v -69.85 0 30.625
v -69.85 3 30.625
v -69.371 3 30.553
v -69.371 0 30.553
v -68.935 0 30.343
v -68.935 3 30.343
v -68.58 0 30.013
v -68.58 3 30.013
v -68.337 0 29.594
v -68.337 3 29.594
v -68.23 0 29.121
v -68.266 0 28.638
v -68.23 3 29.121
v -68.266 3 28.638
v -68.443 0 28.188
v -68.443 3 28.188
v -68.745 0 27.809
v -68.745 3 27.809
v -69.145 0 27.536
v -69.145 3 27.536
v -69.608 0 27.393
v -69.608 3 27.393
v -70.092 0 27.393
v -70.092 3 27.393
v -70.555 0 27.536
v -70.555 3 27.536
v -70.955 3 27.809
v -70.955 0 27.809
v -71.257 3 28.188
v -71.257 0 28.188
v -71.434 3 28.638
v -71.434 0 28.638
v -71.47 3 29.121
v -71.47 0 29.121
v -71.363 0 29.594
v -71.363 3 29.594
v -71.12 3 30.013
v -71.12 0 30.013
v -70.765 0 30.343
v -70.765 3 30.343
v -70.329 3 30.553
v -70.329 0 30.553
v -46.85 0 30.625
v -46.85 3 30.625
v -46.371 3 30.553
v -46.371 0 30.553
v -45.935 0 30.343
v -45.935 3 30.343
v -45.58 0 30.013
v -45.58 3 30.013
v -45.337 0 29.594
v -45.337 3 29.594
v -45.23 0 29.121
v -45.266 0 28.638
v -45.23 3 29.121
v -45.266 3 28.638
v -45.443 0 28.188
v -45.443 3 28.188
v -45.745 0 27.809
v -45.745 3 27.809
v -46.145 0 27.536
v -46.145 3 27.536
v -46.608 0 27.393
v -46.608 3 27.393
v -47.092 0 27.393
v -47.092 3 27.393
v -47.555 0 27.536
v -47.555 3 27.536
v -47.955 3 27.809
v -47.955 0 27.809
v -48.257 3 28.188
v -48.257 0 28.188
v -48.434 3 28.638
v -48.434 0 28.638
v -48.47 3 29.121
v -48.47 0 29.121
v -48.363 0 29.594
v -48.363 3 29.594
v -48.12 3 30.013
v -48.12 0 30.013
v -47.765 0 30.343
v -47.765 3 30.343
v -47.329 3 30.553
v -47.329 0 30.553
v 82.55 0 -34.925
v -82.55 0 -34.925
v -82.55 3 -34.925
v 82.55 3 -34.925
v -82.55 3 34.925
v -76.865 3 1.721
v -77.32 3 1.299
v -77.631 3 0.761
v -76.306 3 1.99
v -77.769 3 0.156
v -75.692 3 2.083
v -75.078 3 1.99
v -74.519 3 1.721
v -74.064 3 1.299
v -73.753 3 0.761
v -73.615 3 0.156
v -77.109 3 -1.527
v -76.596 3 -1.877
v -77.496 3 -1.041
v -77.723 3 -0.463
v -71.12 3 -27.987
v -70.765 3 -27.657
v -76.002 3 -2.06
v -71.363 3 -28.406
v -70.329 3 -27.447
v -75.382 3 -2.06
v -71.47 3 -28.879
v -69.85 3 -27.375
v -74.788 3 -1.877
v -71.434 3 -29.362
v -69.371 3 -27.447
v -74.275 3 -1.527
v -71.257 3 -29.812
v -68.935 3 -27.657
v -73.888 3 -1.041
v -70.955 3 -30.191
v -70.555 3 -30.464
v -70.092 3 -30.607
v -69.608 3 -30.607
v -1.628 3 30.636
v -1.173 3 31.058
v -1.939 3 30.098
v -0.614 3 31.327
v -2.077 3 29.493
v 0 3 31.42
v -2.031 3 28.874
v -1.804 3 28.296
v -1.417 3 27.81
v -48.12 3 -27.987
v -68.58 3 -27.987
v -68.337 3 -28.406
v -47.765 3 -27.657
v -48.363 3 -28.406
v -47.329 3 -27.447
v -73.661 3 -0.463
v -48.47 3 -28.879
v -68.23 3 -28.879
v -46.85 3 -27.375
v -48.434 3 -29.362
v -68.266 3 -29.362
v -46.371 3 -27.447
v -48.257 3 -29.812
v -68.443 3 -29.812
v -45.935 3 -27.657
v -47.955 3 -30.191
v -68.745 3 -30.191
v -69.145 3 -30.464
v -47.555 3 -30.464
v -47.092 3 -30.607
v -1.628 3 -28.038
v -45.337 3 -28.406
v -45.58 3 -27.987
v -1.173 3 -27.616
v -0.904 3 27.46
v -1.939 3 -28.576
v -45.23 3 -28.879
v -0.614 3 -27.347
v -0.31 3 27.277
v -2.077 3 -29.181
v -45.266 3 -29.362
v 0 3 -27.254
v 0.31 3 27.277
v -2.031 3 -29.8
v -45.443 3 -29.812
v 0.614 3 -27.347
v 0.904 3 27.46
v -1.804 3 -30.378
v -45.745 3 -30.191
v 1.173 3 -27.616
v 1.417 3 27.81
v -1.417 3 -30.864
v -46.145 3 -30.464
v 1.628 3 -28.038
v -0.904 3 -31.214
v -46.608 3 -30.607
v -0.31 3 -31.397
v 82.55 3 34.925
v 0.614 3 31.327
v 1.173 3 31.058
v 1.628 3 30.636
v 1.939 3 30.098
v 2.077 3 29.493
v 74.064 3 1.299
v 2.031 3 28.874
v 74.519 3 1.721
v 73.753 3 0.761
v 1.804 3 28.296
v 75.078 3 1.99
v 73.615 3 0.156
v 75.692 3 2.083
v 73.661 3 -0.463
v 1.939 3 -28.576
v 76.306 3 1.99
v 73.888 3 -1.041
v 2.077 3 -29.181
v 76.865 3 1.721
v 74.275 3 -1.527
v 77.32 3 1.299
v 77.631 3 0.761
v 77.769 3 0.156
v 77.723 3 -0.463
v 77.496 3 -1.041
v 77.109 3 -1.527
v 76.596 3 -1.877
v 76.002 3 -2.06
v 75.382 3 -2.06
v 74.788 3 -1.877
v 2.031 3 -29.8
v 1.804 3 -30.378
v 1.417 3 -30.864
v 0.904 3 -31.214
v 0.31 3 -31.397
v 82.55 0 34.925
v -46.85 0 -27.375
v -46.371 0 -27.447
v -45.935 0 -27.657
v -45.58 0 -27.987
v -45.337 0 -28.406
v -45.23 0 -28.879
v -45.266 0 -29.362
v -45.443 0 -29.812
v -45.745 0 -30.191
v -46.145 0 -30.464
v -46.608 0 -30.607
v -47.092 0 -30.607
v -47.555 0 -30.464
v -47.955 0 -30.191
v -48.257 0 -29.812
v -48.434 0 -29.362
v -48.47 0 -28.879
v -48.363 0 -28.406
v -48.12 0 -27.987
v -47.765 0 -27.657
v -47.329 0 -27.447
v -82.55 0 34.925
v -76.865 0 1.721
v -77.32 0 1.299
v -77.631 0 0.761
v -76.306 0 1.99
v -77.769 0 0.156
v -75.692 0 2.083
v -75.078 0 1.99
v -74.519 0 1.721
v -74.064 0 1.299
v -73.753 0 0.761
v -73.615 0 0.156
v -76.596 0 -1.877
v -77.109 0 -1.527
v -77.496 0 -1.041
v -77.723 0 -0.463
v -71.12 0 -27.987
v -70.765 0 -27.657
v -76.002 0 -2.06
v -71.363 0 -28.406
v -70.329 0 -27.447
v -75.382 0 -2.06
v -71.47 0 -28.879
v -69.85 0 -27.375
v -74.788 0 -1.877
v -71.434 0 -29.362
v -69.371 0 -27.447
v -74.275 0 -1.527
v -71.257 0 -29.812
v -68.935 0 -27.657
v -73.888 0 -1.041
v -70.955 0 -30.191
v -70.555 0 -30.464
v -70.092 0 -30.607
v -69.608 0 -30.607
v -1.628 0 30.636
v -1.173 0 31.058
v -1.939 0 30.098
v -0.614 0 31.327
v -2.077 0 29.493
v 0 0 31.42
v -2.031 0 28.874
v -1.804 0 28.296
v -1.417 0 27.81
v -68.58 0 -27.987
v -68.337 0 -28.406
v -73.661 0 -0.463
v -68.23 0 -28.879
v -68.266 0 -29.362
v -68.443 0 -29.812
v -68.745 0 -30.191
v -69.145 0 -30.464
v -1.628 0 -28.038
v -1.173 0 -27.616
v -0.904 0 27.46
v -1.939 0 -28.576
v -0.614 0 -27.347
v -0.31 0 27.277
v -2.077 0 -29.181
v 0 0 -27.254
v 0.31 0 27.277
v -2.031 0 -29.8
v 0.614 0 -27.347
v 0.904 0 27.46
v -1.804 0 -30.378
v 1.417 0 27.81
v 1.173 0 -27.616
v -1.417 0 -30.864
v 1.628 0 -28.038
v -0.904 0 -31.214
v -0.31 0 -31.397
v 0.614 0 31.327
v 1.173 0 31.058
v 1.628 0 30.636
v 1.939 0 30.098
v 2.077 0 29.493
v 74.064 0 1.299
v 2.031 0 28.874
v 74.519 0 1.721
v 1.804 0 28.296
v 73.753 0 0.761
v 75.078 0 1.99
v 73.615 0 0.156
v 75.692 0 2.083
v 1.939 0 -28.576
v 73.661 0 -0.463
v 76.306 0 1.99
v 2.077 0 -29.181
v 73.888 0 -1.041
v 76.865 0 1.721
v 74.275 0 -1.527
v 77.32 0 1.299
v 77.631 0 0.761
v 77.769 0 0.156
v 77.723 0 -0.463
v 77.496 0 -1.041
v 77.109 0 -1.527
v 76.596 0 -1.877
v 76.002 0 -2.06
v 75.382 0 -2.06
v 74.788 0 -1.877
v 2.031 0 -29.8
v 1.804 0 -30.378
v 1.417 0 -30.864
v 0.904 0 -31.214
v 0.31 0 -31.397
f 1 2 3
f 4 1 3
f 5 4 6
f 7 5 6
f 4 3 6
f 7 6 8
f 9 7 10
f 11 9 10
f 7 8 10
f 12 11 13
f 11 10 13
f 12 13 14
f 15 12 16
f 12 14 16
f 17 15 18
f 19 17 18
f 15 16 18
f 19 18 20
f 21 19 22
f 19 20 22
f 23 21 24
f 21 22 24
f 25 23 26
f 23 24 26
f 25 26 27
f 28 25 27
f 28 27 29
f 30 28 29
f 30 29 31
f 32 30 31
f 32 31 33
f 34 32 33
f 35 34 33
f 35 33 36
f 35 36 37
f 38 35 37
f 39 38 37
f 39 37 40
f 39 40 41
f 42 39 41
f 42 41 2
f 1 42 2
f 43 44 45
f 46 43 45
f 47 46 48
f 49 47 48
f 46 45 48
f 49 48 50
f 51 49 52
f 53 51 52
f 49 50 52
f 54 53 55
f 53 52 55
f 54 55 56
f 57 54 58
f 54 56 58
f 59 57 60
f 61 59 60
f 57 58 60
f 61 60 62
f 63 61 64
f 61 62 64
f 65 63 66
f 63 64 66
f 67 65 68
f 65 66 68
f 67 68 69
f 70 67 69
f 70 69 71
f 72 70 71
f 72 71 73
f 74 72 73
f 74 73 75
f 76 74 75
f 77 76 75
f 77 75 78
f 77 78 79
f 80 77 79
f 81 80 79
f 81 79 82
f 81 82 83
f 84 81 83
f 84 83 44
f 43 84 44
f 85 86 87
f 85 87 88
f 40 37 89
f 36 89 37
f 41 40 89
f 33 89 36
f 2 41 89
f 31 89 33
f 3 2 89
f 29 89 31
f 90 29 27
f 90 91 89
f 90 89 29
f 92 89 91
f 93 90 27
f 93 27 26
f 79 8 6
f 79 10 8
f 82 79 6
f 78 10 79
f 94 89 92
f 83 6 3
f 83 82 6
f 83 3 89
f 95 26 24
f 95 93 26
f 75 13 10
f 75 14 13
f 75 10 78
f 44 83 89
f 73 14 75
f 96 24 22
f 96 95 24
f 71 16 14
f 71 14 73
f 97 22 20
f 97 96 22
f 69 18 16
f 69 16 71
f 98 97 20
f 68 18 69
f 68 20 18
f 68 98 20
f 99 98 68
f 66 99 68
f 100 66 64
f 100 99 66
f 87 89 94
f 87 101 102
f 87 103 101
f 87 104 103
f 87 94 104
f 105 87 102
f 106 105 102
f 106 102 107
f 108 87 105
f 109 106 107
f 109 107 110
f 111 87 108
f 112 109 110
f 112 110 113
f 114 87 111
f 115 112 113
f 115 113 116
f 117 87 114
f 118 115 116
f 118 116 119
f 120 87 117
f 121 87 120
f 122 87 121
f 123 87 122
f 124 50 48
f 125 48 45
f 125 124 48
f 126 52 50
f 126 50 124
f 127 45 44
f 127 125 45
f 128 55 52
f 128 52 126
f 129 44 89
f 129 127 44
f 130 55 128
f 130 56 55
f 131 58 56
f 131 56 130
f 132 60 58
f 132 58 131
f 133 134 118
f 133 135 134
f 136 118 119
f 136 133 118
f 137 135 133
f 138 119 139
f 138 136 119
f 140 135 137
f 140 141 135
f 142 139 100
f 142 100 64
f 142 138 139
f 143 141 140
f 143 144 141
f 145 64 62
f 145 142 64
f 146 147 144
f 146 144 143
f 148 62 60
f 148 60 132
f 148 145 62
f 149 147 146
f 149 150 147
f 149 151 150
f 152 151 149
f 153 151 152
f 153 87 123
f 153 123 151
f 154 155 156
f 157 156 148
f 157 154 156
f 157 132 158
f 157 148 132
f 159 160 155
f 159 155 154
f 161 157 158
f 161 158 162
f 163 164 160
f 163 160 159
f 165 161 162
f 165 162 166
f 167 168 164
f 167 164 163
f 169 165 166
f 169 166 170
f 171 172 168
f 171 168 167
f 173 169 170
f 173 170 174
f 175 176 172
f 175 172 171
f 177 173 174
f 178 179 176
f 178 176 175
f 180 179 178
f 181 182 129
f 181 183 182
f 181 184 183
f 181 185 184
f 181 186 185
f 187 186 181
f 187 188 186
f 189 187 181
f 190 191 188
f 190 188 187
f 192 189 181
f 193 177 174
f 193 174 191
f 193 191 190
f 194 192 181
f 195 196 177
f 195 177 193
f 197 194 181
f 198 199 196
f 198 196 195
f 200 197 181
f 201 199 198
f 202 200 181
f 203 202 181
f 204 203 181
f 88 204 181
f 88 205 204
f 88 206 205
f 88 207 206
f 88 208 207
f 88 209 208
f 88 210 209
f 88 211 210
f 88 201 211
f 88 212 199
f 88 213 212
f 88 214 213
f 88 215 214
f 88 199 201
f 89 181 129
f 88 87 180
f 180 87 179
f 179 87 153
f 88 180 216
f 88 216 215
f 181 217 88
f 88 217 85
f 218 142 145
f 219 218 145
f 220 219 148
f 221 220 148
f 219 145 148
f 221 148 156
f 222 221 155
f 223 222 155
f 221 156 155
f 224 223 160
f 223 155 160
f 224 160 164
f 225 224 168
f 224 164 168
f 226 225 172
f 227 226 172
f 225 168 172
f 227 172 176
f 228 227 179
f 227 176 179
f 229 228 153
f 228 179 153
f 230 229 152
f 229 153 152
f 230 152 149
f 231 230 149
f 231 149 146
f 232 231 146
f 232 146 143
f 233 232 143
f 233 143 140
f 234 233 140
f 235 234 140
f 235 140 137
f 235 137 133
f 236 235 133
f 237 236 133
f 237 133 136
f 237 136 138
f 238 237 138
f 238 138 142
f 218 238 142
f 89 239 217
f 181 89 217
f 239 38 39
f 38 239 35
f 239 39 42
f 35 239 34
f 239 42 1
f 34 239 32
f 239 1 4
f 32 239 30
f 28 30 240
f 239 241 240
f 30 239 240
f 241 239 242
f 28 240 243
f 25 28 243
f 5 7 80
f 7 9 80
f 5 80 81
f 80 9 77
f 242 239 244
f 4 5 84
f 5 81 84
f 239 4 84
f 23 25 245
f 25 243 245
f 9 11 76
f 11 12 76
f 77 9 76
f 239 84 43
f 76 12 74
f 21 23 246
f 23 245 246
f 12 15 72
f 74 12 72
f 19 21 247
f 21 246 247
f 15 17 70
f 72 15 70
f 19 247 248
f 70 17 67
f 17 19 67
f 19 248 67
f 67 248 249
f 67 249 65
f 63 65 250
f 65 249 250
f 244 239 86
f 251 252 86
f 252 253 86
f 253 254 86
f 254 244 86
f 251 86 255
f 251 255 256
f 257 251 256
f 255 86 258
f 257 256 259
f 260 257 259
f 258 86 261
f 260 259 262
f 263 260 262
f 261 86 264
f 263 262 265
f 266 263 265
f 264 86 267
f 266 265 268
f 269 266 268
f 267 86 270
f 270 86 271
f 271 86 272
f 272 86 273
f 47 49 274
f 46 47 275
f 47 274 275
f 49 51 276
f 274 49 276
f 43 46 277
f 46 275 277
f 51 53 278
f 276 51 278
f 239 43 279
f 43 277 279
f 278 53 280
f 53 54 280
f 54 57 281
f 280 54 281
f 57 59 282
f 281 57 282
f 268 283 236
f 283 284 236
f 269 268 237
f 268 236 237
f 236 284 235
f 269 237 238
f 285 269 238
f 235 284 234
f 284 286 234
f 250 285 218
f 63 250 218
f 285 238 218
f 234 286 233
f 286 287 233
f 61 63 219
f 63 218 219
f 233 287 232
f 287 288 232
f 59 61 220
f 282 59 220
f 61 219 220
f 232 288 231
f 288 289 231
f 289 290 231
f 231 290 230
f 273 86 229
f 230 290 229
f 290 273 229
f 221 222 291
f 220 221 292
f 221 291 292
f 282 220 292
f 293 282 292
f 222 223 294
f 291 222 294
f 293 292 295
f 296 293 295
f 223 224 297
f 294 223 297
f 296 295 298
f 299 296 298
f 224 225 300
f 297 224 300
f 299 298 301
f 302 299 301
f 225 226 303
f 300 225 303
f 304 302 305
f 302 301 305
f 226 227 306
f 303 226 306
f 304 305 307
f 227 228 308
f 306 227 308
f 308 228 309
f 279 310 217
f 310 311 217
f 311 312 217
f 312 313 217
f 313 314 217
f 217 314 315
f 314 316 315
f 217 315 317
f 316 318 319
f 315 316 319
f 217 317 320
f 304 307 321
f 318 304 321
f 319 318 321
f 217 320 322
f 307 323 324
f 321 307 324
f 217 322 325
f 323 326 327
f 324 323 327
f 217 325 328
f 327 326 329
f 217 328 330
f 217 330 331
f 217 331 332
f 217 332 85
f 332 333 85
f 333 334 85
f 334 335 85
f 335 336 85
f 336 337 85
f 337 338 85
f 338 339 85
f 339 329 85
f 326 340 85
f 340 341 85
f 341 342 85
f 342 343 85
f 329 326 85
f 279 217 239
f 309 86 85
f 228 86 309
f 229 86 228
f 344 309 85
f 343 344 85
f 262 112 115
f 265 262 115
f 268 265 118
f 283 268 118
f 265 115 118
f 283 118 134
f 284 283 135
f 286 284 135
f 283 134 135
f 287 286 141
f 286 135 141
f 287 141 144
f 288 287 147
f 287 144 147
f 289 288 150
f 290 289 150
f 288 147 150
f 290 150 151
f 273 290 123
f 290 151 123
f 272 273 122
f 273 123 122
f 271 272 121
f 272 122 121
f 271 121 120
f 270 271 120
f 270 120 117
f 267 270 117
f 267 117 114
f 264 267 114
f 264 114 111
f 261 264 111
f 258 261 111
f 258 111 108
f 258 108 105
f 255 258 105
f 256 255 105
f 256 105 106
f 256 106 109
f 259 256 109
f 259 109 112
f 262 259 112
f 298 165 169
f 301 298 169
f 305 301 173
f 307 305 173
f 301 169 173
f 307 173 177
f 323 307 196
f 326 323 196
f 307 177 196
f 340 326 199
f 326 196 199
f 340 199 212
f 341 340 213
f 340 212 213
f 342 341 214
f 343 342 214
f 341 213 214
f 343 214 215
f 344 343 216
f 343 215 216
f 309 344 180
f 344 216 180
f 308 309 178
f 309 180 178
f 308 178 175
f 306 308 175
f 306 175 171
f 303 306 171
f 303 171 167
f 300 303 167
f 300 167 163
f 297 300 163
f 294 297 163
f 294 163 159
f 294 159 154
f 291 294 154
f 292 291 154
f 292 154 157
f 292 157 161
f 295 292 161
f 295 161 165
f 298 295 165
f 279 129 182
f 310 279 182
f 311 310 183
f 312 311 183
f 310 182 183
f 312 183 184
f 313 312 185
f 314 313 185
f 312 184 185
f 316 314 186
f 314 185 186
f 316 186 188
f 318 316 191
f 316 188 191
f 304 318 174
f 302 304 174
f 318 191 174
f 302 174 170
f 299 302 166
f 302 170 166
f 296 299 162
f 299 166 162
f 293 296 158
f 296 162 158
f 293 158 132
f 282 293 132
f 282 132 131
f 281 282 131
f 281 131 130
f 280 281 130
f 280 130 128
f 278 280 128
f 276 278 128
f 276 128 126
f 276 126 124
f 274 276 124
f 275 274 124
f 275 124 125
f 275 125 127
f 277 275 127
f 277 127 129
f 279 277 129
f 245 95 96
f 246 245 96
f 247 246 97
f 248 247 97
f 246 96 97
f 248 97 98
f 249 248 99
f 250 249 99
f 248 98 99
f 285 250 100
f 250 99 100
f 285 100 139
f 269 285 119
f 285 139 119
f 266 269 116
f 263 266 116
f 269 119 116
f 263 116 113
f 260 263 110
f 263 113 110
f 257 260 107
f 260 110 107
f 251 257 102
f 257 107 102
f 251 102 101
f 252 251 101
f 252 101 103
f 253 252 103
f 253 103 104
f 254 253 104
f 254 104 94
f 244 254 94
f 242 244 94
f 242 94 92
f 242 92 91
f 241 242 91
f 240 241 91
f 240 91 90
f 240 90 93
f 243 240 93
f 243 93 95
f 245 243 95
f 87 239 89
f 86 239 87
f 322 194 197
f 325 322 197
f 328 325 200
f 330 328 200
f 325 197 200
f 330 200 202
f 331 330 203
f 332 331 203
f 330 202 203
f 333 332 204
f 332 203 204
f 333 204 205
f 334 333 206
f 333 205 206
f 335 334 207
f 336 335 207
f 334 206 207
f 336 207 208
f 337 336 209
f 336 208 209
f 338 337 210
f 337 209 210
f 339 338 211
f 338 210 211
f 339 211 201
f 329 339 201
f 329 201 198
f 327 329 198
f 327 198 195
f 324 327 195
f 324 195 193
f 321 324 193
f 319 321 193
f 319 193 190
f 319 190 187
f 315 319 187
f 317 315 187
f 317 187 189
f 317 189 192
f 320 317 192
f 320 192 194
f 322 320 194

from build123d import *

# Parameters (mm, degrees)
SKETCH1_W           = 165.1
SKETCH1_H           = 69.85
BOSS_EXTRUDE1_DEPTH = 3
SKETCH3_R           = 2.0828
CUT_EXTRUDE2_DEPTH  = 5.08
SKETCH4_R           = 1.625
CUT_EXTRUDE3_DEPTH  = 17.78


with BuildPart() as part:
    # Sketch1 → Boss-Extrude1 (new body)
    with BuildSketch(Plane(origin=(0, 0, 0), x_dir=(1, 0, 0), z_dir=(0, 1, 0))):
        Rectangle(SKETCH1_W, SKETCH1_H)
    extrude(amount=BOSS_EXTRUDE1_DEPTH)

    # Sketch3 → Cut-Extrude2 (cut)
    with BuildSketch(Plane(origin=(0, 3, 0), x_dir=(1, 0, 0), z_dir=(0, 1, 0))):
        with Locations(Location((-75.692, 0, 0), (0, 0, 270))):
            Circle(SKETCH3_R)
        with Locations(Location((75.692, 0, 0), (0, 0, 270))):
            Circle(SKETCH3_R)
        with Locations(Location((0, -29.337, 0), (0, 0, 270))):
            Circle(SKETCH3_R)
        with Locations(Location((0, 29.337, 0), (0, 0, 270))):
            Circle(SKETCH3_R)
    extrude(amount=-CUT_EXTRUDE2_DEPTH, mode=Mode.SUBTRACT)

    # Sketch4 → Cut-Extrude3 (cut)
    with BuildSketch(Plane(origin=(0, 3, 0), x_dir=(1, 0, 0), z_dir=(0, 1, 0))):
        with Locations(Location((-69.85, 29, 0), (0, 0, 270))):
            Circle(SKETCH4_R)
        with Locations(Location((-46.85, 29, 0), (0, 0, 270))):
            Circle(SKETCH4_R)
        with Locations(Location((-46.85, -29, 0), (0, 0, 270))):
            Circle(SKETCH4_R)
        with Locations(Location((-69.85, -29, 0), (0, 0, 270))):
            Circle(SKETCH4_R)
    extrude(amount=-CUT_EXTRUDE3_DEPTH, mode=Mode.SUBTRACT)


solid = part.part
